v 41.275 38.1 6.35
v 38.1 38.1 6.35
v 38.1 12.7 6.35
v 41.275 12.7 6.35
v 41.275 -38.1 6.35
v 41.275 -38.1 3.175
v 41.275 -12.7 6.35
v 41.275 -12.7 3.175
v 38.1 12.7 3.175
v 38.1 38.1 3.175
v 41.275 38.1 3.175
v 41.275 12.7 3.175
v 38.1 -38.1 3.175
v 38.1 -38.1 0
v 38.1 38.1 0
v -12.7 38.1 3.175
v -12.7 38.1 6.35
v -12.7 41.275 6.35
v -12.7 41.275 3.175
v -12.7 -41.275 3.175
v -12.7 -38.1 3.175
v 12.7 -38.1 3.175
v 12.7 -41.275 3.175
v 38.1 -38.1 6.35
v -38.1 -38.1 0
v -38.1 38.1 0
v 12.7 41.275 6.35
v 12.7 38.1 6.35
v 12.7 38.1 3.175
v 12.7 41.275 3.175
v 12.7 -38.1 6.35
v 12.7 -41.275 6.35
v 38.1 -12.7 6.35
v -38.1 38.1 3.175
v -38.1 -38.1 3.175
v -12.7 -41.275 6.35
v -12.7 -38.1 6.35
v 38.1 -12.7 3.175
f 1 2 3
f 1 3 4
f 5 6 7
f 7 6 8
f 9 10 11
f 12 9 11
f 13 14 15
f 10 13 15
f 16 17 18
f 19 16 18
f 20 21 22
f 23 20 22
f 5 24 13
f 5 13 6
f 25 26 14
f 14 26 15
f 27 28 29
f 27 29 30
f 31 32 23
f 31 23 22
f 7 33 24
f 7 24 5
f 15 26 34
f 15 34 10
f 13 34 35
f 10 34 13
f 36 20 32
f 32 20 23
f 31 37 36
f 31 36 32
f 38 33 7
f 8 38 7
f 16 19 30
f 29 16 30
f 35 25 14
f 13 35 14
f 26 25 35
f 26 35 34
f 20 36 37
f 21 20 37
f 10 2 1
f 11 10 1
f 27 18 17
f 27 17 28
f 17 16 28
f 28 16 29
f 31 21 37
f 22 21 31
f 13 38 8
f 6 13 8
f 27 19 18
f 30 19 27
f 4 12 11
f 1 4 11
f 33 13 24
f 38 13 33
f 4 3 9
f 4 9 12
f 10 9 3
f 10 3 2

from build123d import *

# Parameters (mm, degrees)
SKETCH2_W             = 76.2
SKETCH2_H             = 76.2
BOSS_EXTRUDE1_DEPTH   = 3.175
SKETCH4_W             = 25.4
SKETCH4_H             = 3.175
BOSS_EXTRUDE3_DEPTH   = 3.175
SKETCH4_W_2           = 3.175
SKETCH4_H_2           = 25.4
BOSS_EXTRUDE3_2_DEPTH = 3.175
BOSS_EXTRUDE3_3_DEPTH = 3.175
BOSS_EXTRUDE3_4_DEPTH = 3.175


with BuildPart() as part:
    # Sketch2 → Boss-Extrude1 (new body)
    with BuildSketch(Plane.XY):
        Rectangle(SKETCH2_W, SKETCH2_H)
    extrude(amount=BOSS_EXTRUDE1_DEPTH)


with BuildPart() as body_2:
    # Sketch4 → Boss-Extrude3 (new body)
    with BuildSketch(Plane.XY.offset(3.175)):
        with Locations((0, -39.6875)):
            Rectangle(SKETCH4_W, SKETCH4_H)
    extrude(amount=BOSS_EXTRUDE3_DEPTH)


with BuildPart() as body_3:
    # Sketch4 → Boss-Extrude3 2 (new body)
    with BuildSketch(Plane.XY.offset(3.175)):
        with Locations((39.6875, 25.4)):
            Rectangle(SKETCH4_W_2, SKETCH4_H_2)
    extrude(amount=BOSS_EXTRUDE3_2_DEPTH)


with BuildPart() as body_4:
    # Sketch4 → Boss-Extrude3 3 (new body)
    with BuildSketch(Plane.XY.offset(3.175)):
        with Locations((39.6875, -25.4)):
            Rectangle(SKETCH4_W_2, SKETCH4_H_2)
    extrude(amount=BOSS_EXTRUDE3_3_DEPTH)


with BuildPart() as body_5:
    # Sketch4 → Boss-Extrude3 4 (new body)
    with BuildSketch(Plane.XY.offset(3.175)):
        with Locations((0, 39.6875)):
            Rectangle(SKETCH4_W, SKETCH4_H)
    extrude(amount=BOSS_EXTRUDE3_4_DEPTH)


solid = Compound([part.part, body_2.part, body_3.part, body_4.part, body_5.part])
